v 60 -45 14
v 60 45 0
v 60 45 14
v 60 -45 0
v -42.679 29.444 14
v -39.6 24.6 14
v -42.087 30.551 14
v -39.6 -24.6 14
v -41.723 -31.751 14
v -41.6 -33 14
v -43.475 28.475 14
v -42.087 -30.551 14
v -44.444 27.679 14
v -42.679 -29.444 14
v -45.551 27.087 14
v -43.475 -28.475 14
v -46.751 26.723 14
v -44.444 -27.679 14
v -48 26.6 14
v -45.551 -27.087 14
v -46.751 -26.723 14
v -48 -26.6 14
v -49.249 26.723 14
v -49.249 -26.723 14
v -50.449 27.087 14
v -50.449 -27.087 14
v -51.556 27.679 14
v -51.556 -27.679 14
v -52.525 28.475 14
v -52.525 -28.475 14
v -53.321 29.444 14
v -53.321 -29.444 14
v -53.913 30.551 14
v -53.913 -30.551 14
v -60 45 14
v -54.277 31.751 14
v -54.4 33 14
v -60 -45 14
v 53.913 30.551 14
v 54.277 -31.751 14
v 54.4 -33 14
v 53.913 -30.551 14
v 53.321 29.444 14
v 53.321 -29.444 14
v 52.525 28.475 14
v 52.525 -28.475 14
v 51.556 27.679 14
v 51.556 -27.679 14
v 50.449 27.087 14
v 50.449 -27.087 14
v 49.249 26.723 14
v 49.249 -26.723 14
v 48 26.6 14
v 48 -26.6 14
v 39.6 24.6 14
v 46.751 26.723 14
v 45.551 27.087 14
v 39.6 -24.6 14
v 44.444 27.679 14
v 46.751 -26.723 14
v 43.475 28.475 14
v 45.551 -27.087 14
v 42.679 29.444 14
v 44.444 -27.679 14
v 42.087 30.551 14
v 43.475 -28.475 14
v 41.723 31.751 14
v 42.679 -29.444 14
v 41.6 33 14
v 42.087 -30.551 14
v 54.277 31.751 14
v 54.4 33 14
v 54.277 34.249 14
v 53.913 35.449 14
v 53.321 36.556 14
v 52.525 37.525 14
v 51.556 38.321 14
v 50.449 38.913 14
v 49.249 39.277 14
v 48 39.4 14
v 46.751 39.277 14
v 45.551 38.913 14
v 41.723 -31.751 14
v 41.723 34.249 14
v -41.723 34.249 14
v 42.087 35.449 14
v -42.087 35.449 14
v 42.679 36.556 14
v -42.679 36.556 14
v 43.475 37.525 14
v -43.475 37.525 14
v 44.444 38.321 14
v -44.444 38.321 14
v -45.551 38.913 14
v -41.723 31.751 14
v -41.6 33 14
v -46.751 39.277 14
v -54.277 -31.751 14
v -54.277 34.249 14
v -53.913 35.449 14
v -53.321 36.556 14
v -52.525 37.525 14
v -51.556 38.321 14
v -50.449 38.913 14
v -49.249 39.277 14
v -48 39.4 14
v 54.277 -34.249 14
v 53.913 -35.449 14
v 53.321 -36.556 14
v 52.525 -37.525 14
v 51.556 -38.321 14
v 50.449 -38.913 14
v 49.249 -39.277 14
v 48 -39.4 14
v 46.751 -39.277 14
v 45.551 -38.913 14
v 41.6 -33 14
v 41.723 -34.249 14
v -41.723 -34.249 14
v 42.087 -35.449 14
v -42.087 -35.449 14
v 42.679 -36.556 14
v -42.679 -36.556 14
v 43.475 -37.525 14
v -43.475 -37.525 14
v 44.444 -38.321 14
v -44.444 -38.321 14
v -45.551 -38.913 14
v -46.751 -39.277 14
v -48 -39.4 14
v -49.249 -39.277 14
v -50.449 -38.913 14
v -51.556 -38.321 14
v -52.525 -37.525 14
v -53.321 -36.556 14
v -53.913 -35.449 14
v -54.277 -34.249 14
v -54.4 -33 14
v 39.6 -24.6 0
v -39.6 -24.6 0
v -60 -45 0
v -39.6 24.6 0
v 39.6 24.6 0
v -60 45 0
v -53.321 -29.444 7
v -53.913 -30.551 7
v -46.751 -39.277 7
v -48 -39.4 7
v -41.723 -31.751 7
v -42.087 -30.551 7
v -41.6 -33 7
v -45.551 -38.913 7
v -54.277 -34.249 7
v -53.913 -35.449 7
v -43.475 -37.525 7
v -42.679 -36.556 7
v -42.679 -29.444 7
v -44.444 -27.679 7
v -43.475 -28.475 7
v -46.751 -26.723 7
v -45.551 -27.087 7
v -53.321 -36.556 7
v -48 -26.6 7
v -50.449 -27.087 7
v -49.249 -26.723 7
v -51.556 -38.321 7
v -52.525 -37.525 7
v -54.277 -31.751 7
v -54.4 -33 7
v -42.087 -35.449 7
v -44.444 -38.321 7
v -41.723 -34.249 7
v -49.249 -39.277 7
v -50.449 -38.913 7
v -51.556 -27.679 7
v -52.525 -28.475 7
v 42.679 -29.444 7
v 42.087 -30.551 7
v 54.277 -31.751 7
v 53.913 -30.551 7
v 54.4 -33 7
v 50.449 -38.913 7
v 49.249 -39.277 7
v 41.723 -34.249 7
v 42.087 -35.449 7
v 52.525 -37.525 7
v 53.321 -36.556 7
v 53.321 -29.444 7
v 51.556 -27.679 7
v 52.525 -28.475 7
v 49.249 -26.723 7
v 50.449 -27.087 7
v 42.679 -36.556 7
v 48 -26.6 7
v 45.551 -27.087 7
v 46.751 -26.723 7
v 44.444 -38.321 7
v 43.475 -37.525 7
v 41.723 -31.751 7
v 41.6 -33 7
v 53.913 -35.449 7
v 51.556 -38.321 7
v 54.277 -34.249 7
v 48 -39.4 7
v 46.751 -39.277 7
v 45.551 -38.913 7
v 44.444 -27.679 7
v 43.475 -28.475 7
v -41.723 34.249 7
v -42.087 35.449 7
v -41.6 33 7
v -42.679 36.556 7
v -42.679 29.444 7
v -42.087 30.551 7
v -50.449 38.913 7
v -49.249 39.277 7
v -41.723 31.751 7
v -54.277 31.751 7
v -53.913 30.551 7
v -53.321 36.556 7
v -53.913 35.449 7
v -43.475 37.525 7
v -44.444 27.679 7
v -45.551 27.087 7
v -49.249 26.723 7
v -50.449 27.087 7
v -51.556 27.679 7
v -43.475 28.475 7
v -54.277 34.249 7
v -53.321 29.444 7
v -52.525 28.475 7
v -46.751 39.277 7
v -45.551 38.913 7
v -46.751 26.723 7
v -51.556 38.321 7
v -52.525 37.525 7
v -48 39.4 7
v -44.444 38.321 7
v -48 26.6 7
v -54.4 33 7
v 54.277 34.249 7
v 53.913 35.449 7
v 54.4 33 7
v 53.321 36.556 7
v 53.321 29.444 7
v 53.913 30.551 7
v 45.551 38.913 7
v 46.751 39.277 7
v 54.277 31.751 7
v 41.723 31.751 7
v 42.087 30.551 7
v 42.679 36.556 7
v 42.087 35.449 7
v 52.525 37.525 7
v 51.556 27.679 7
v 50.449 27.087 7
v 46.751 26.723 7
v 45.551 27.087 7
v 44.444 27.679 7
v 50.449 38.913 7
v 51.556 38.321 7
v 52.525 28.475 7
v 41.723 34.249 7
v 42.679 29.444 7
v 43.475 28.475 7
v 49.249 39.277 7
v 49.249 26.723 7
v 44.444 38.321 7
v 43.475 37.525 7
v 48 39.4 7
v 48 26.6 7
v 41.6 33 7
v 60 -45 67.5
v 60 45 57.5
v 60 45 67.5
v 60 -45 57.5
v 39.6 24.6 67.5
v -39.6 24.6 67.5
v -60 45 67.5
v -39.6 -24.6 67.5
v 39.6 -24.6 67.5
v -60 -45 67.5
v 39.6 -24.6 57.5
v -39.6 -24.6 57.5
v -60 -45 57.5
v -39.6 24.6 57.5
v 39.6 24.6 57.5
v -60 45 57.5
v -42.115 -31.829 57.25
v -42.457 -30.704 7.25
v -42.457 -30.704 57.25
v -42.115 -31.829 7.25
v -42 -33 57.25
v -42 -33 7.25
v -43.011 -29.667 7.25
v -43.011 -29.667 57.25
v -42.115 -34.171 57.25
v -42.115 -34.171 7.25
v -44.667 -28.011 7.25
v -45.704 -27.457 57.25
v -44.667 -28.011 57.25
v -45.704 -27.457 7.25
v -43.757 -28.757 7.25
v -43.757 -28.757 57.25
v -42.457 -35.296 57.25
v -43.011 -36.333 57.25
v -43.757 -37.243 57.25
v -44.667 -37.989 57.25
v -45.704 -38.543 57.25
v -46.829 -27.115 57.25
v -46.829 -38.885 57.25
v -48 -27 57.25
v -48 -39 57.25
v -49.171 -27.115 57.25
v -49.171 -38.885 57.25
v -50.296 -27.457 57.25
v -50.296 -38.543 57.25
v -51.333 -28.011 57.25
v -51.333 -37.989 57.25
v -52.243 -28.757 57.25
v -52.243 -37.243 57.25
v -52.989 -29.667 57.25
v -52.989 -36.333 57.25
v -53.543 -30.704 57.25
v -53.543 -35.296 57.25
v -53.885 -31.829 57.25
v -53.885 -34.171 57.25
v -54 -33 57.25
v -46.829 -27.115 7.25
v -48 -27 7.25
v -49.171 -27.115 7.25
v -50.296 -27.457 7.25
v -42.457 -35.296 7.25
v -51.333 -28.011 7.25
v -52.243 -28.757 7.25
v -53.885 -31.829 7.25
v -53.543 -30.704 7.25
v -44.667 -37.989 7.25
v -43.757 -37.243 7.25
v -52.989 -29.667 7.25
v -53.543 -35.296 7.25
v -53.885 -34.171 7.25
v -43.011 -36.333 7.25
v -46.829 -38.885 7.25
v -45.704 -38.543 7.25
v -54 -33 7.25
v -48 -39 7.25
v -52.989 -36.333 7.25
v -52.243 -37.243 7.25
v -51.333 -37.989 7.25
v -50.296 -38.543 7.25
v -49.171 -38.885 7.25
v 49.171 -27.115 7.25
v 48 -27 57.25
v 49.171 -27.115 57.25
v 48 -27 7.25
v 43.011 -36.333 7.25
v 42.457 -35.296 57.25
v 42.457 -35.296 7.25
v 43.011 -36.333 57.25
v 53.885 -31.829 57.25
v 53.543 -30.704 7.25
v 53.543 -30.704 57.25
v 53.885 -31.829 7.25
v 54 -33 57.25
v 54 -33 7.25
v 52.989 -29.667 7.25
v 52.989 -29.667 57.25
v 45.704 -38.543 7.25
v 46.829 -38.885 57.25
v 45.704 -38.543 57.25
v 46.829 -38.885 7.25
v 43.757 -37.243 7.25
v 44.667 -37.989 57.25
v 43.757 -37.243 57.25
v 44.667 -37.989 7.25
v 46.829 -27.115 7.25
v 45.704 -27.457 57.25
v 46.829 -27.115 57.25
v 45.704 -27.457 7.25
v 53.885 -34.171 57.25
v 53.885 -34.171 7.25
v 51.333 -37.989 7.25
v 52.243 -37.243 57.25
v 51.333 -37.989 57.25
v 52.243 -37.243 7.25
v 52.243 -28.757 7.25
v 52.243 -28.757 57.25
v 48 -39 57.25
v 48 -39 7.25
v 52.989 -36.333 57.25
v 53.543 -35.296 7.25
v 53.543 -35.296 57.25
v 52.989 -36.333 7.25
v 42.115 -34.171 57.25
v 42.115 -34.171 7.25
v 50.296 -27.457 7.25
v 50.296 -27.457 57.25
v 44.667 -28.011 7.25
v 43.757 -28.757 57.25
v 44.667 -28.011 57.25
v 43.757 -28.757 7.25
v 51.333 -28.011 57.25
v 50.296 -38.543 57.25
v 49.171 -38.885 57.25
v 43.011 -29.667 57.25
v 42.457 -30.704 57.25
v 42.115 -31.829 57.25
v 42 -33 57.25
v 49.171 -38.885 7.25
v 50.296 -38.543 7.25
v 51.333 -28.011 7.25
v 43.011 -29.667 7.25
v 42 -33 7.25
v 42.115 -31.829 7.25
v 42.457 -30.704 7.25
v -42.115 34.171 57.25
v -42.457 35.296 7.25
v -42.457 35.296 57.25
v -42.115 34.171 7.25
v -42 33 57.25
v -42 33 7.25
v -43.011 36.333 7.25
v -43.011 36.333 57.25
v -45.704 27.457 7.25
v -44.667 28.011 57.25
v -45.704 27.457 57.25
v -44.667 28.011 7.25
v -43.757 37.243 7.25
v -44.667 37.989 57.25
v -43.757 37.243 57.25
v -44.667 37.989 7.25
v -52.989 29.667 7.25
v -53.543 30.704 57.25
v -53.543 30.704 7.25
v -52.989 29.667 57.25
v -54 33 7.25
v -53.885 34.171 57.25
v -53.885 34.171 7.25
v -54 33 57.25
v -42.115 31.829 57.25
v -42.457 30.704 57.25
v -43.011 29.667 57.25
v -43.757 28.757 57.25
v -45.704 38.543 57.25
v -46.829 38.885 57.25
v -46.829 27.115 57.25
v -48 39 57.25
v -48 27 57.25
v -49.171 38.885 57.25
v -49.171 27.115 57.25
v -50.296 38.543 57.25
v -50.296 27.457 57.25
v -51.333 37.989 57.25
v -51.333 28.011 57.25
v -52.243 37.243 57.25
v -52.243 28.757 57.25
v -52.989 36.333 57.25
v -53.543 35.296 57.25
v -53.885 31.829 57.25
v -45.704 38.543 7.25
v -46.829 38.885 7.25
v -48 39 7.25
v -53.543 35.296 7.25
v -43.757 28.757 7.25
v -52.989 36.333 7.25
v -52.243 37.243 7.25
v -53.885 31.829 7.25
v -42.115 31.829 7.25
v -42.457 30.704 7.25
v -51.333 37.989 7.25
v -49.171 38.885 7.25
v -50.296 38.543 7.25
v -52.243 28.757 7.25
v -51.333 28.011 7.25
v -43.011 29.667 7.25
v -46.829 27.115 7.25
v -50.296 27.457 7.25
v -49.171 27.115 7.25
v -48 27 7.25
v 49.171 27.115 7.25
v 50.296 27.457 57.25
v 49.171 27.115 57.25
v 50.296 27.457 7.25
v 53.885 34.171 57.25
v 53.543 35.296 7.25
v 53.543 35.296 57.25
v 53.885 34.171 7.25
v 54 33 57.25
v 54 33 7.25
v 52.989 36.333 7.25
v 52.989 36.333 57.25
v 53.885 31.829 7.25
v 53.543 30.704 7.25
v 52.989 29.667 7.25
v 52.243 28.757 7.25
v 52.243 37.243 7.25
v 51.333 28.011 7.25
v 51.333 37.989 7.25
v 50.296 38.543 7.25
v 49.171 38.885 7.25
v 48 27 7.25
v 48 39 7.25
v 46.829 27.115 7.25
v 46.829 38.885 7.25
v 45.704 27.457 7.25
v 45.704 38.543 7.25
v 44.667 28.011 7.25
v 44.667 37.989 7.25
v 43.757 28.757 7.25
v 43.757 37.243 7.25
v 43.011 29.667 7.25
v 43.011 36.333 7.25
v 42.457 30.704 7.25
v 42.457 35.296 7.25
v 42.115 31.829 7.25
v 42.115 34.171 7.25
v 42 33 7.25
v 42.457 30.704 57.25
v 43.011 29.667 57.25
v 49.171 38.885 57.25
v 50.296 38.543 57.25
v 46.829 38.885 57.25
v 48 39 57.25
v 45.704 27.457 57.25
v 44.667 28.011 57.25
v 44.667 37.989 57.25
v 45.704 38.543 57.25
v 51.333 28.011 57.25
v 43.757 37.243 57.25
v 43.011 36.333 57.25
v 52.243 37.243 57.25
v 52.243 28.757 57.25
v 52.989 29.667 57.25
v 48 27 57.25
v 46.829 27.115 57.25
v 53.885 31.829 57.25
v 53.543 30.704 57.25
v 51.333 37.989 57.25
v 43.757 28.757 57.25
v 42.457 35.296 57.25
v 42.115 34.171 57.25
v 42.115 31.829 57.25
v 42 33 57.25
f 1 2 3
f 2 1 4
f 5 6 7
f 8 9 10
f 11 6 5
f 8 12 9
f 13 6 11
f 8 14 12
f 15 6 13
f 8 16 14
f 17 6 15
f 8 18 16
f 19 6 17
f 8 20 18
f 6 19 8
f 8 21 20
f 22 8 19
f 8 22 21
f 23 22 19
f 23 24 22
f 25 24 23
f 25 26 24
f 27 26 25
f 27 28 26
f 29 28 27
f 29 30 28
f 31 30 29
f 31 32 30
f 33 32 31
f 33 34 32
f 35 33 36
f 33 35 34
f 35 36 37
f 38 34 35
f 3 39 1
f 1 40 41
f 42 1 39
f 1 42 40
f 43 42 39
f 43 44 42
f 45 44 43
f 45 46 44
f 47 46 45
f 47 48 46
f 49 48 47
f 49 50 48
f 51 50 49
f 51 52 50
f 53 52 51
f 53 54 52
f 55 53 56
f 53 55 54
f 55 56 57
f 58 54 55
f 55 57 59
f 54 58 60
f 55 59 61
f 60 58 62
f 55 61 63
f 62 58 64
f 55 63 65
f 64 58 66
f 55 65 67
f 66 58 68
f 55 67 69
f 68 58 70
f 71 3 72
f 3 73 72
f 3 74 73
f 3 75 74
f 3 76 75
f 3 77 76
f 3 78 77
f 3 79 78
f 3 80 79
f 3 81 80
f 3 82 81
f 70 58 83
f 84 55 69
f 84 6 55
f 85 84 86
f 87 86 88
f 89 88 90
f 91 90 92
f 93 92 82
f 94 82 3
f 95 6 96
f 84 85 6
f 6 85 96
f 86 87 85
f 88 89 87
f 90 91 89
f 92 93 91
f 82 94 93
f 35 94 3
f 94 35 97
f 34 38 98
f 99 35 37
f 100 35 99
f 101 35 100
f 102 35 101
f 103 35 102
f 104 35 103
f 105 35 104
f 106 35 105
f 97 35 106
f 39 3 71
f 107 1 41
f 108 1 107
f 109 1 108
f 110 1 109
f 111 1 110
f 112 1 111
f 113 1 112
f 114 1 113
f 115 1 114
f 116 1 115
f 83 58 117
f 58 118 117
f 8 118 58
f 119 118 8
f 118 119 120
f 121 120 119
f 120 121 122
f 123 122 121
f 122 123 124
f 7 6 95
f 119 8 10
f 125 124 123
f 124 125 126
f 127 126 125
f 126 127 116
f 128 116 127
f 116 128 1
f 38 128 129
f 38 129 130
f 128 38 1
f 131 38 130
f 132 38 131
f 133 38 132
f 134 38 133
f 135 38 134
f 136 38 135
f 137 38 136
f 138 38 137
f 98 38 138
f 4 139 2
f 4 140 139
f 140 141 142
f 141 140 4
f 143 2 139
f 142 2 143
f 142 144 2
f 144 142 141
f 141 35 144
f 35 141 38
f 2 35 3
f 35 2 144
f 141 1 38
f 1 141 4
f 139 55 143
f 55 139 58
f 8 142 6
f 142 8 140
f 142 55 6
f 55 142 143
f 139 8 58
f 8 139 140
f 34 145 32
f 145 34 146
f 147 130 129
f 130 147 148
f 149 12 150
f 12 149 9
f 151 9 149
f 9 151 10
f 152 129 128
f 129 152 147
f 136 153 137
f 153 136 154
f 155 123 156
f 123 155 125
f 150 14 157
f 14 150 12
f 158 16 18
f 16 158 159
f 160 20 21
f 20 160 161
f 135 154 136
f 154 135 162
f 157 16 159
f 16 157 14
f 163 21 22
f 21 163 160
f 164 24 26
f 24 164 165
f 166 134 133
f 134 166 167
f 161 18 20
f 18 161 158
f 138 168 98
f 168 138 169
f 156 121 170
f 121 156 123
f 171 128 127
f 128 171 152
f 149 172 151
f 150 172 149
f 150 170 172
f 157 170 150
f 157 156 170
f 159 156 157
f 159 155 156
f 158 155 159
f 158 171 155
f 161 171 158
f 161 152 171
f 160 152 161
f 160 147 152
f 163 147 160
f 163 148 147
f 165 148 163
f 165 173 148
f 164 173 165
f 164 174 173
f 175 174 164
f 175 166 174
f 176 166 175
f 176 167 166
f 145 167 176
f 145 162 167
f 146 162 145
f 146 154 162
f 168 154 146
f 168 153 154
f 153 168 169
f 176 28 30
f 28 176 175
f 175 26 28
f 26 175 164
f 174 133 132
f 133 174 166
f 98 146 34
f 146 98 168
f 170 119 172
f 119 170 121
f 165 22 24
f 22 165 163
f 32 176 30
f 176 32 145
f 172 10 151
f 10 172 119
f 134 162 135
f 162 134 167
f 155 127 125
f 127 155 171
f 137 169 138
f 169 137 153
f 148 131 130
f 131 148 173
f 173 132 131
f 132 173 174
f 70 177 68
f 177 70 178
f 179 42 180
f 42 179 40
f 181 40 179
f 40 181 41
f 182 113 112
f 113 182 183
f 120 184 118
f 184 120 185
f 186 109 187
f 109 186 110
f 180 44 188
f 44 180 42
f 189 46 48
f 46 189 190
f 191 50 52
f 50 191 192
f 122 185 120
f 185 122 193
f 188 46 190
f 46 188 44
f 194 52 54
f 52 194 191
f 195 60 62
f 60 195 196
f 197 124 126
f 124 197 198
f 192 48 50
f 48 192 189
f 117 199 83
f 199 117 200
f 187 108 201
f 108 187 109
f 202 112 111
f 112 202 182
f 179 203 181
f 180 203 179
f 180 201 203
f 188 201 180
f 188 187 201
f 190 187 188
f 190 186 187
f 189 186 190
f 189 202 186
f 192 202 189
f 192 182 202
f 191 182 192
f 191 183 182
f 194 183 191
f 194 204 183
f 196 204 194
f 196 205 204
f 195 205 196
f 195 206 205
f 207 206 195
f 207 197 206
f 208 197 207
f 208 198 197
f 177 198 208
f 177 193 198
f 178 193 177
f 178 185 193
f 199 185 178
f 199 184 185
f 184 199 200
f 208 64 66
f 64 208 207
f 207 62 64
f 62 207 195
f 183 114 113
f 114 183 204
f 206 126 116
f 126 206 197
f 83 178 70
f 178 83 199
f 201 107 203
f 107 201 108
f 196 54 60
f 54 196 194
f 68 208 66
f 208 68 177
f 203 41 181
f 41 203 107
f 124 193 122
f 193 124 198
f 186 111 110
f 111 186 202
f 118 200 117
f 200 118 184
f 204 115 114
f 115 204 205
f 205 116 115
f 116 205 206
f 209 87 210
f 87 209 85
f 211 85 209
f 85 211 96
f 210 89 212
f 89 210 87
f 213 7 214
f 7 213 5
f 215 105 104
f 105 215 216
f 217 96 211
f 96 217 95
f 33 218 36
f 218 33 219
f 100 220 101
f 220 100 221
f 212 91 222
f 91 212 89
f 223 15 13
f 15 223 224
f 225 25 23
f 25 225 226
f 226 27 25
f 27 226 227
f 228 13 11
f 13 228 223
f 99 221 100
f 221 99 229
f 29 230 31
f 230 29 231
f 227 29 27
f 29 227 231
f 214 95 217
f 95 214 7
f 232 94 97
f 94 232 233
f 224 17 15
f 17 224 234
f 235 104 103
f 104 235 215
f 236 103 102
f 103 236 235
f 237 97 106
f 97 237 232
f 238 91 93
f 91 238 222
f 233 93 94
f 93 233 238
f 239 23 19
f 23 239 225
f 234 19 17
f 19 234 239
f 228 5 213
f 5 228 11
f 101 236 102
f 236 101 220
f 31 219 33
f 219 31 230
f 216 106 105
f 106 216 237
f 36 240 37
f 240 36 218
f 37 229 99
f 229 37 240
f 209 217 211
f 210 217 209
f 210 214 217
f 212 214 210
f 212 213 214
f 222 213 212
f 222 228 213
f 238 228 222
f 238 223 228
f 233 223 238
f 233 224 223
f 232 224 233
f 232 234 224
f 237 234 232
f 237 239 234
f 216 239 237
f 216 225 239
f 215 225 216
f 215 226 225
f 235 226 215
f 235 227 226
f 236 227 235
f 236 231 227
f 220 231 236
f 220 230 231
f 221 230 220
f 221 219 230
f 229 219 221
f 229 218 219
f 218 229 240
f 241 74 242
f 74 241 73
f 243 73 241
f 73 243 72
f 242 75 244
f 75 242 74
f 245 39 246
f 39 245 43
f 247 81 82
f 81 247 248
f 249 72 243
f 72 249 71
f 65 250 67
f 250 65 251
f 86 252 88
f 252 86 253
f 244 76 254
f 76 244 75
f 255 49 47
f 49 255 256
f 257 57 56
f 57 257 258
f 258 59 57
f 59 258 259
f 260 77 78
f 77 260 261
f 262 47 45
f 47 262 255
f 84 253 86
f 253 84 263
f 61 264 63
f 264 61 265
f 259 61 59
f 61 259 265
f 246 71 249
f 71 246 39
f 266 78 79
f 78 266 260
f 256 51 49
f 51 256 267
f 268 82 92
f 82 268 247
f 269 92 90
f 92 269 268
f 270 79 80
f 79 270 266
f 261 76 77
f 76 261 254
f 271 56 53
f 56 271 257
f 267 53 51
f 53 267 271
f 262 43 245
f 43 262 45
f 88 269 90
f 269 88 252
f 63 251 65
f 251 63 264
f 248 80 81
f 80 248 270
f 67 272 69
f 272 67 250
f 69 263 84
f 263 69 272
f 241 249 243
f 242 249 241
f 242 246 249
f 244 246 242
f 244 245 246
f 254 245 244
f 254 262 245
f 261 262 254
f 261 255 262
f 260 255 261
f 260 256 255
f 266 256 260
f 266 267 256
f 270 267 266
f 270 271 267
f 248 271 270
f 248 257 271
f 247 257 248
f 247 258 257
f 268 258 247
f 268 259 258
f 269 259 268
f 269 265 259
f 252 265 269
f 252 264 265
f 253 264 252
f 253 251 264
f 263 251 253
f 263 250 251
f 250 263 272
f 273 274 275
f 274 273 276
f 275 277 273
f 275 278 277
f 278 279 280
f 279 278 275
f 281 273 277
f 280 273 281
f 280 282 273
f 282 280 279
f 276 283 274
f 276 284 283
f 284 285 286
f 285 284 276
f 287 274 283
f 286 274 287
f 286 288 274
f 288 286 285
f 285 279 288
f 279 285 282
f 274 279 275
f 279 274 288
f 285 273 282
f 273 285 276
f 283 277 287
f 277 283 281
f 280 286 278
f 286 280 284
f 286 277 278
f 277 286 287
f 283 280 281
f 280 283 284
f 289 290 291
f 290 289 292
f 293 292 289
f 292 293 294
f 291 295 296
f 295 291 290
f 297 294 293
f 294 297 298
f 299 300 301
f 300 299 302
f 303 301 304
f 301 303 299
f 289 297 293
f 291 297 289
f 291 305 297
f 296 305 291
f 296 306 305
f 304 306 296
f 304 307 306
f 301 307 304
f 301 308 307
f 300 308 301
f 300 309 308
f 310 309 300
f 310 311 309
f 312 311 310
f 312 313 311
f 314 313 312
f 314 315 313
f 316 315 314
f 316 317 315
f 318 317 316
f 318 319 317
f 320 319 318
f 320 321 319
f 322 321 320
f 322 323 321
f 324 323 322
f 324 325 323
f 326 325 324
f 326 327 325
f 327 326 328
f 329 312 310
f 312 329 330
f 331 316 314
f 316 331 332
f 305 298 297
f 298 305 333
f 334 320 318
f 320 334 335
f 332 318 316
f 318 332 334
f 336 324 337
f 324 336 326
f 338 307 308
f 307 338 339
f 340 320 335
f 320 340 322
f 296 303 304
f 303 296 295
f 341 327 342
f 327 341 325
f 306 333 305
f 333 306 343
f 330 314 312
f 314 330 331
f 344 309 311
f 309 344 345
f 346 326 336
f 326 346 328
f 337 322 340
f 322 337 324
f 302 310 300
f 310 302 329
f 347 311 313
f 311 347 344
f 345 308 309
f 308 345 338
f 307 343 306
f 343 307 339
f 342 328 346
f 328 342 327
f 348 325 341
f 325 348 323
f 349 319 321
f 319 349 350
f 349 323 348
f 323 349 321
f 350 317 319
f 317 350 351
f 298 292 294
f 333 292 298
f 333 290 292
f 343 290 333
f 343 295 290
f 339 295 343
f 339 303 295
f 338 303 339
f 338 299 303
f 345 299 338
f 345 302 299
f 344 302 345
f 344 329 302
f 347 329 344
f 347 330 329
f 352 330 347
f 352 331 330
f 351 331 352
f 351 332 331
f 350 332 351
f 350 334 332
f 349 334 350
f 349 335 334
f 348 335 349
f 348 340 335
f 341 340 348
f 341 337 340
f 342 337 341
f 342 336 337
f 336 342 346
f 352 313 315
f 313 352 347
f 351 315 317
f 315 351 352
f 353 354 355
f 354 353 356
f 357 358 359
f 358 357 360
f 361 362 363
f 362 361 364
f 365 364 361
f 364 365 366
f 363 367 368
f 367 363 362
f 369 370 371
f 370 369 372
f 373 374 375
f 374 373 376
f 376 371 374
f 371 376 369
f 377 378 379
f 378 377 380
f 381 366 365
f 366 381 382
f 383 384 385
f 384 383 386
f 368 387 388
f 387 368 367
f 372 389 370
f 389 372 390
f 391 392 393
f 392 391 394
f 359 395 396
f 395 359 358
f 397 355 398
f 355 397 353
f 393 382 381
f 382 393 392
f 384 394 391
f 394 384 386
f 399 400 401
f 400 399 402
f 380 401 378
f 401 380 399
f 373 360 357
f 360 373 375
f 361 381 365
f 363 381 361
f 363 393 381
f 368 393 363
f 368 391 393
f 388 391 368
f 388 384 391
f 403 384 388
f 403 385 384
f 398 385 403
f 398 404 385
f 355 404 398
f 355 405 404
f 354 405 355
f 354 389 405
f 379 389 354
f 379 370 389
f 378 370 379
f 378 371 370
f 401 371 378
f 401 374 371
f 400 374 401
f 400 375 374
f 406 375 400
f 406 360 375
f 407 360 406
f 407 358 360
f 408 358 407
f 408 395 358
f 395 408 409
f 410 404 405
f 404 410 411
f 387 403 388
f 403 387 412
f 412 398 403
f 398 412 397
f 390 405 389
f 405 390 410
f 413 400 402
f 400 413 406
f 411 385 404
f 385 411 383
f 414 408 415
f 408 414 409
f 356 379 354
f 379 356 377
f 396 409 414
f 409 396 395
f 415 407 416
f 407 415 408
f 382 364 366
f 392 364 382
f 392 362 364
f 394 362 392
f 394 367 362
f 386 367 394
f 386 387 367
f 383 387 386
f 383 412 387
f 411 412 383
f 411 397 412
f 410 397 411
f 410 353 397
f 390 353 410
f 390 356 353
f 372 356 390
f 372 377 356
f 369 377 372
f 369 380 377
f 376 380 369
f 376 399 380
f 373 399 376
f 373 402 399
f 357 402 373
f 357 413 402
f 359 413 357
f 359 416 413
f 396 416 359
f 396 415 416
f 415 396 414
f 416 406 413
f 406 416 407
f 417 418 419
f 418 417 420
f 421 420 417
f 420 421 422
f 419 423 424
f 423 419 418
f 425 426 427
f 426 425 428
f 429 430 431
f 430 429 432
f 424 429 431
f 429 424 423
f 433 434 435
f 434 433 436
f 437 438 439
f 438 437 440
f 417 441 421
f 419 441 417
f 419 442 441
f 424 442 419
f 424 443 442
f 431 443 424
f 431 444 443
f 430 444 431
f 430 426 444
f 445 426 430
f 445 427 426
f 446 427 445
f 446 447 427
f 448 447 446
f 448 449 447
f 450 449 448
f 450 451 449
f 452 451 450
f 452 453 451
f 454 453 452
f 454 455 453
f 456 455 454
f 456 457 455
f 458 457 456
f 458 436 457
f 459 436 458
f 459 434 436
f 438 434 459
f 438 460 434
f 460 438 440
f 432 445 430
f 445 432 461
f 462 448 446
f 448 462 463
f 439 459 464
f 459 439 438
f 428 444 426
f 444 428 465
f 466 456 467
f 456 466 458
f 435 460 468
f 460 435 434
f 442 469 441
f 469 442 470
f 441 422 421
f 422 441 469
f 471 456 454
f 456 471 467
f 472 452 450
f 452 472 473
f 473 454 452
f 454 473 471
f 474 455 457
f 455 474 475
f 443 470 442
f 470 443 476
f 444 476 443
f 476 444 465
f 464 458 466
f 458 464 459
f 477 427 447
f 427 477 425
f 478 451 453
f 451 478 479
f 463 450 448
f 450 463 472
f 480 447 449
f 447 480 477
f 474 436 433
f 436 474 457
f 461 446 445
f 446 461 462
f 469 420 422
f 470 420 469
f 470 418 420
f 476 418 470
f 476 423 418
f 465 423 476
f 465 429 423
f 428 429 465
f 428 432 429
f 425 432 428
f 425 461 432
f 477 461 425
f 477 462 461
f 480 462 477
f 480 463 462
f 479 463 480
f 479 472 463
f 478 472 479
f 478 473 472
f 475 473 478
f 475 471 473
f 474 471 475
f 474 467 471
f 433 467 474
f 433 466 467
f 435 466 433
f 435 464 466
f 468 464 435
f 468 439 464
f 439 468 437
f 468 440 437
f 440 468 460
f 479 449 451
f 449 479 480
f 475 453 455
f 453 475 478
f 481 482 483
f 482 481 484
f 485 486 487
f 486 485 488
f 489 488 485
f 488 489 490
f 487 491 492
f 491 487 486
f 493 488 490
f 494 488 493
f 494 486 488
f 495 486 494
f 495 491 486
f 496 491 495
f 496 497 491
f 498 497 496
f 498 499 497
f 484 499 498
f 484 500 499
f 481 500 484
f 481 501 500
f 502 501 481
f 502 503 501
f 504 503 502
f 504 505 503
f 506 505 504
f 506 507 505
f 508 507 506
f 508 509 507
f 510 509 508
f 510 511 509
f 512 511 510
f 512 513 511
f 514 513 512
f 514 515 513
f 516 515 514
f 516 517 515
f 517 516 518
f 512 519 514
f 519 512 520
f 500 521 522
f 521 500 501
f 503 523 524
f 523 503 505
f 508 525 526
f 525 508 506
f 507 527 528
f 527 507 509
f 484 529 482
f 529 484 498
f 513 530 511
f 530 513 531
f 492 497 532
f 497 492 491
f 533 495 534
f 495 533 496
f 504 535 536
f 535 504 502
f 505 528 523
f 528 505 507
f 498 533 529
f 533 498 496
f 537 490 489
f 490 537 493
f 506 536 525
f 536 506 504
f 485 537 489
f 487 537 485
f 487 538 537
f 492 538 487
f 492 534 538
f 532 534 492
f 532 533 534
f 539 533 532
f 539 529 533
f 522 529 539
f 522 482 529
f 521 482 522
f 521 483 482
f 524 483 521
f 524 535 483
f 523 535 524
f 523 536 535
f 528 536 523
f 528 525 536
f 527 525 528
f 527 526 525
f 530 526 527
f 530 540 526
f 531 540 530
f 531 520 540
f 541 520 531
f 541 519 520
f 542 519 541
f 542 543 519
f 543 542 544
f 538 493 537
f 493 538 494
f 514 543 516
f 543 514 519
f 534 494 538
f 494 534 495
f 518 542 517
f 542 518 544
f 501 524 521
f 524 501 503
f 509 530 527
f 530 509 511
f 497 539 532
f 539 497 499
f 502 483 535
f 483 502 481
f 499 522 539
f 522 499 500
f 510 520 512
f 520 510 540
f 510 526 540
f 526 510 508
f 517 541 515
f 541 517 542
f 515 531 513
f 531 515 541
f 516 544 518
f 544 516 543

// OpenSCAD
$fn = 32;

// ------------------------------------------------------------------------
// Frame cube: base 120 x 90 mm, posts 50 mm tall
// Every part is its own module, assembly() places every instance.
// ------------------------------------------------------------------------

// --- part 1 ---
module base_frame() {
  difference() {
    translate([-60, -45, 0]) cube([120, 90, 14]);
    translate([-39.6, -24.6, -1]) cube([79.2, 49.2, 16]);
    translate([-48, -33, 7]) cylinder(h = 8, d = 12.8);
    translate([48, -33, 7]) cylinder(h = 8, d = 12.8);
    translate([-48, 33, 7]) cylinder(h = 8, d = 12.8);
    translate([48, 33, 7]) cylinder(h = 8, d = 12.8);
  }
}

// --- part 2 ---
module corner_post() {
  cylinder(h = 50, d = 12);
}

// --- part 3 ---
module top_frame() {
  difference() {
    translate([-60, -45, 0]) cube([120, 90, 10]);
    translate([-39.6, -24.6, -1]) cube([79.2, 49.2, 12]);
  }
}

// --- assembly ---
module assembly() {
  color([0.80, 0.24, 0.20]) translate([0, 0, 0]) rotate([0, 0, 0]) base_frame();
  color([0.20, 0.45, 0.75]) translate([-48, -33, 7.25]) rotate([0, 0, 0]) corner_post();
  color([0.25, 0.62, 0.32]) translate([48, -33, 7.25]) rotate([0, 0, 0]) corner_post();
  color([0.92, 0.70, 0.18]) translate([-48, 33, 7.25]) rotate([0, 0, 0]) corner_post();
  color([0.58, 0.35, 0.70]) translate([48, 33, 7.25]) rotate([0, 0, 0]) corner_post();
  color([0.16, 0.66, 0.66]) translate([0, 0, 57.5]) rotate([0, 0, 0]) top_frame();
}

assembly();
